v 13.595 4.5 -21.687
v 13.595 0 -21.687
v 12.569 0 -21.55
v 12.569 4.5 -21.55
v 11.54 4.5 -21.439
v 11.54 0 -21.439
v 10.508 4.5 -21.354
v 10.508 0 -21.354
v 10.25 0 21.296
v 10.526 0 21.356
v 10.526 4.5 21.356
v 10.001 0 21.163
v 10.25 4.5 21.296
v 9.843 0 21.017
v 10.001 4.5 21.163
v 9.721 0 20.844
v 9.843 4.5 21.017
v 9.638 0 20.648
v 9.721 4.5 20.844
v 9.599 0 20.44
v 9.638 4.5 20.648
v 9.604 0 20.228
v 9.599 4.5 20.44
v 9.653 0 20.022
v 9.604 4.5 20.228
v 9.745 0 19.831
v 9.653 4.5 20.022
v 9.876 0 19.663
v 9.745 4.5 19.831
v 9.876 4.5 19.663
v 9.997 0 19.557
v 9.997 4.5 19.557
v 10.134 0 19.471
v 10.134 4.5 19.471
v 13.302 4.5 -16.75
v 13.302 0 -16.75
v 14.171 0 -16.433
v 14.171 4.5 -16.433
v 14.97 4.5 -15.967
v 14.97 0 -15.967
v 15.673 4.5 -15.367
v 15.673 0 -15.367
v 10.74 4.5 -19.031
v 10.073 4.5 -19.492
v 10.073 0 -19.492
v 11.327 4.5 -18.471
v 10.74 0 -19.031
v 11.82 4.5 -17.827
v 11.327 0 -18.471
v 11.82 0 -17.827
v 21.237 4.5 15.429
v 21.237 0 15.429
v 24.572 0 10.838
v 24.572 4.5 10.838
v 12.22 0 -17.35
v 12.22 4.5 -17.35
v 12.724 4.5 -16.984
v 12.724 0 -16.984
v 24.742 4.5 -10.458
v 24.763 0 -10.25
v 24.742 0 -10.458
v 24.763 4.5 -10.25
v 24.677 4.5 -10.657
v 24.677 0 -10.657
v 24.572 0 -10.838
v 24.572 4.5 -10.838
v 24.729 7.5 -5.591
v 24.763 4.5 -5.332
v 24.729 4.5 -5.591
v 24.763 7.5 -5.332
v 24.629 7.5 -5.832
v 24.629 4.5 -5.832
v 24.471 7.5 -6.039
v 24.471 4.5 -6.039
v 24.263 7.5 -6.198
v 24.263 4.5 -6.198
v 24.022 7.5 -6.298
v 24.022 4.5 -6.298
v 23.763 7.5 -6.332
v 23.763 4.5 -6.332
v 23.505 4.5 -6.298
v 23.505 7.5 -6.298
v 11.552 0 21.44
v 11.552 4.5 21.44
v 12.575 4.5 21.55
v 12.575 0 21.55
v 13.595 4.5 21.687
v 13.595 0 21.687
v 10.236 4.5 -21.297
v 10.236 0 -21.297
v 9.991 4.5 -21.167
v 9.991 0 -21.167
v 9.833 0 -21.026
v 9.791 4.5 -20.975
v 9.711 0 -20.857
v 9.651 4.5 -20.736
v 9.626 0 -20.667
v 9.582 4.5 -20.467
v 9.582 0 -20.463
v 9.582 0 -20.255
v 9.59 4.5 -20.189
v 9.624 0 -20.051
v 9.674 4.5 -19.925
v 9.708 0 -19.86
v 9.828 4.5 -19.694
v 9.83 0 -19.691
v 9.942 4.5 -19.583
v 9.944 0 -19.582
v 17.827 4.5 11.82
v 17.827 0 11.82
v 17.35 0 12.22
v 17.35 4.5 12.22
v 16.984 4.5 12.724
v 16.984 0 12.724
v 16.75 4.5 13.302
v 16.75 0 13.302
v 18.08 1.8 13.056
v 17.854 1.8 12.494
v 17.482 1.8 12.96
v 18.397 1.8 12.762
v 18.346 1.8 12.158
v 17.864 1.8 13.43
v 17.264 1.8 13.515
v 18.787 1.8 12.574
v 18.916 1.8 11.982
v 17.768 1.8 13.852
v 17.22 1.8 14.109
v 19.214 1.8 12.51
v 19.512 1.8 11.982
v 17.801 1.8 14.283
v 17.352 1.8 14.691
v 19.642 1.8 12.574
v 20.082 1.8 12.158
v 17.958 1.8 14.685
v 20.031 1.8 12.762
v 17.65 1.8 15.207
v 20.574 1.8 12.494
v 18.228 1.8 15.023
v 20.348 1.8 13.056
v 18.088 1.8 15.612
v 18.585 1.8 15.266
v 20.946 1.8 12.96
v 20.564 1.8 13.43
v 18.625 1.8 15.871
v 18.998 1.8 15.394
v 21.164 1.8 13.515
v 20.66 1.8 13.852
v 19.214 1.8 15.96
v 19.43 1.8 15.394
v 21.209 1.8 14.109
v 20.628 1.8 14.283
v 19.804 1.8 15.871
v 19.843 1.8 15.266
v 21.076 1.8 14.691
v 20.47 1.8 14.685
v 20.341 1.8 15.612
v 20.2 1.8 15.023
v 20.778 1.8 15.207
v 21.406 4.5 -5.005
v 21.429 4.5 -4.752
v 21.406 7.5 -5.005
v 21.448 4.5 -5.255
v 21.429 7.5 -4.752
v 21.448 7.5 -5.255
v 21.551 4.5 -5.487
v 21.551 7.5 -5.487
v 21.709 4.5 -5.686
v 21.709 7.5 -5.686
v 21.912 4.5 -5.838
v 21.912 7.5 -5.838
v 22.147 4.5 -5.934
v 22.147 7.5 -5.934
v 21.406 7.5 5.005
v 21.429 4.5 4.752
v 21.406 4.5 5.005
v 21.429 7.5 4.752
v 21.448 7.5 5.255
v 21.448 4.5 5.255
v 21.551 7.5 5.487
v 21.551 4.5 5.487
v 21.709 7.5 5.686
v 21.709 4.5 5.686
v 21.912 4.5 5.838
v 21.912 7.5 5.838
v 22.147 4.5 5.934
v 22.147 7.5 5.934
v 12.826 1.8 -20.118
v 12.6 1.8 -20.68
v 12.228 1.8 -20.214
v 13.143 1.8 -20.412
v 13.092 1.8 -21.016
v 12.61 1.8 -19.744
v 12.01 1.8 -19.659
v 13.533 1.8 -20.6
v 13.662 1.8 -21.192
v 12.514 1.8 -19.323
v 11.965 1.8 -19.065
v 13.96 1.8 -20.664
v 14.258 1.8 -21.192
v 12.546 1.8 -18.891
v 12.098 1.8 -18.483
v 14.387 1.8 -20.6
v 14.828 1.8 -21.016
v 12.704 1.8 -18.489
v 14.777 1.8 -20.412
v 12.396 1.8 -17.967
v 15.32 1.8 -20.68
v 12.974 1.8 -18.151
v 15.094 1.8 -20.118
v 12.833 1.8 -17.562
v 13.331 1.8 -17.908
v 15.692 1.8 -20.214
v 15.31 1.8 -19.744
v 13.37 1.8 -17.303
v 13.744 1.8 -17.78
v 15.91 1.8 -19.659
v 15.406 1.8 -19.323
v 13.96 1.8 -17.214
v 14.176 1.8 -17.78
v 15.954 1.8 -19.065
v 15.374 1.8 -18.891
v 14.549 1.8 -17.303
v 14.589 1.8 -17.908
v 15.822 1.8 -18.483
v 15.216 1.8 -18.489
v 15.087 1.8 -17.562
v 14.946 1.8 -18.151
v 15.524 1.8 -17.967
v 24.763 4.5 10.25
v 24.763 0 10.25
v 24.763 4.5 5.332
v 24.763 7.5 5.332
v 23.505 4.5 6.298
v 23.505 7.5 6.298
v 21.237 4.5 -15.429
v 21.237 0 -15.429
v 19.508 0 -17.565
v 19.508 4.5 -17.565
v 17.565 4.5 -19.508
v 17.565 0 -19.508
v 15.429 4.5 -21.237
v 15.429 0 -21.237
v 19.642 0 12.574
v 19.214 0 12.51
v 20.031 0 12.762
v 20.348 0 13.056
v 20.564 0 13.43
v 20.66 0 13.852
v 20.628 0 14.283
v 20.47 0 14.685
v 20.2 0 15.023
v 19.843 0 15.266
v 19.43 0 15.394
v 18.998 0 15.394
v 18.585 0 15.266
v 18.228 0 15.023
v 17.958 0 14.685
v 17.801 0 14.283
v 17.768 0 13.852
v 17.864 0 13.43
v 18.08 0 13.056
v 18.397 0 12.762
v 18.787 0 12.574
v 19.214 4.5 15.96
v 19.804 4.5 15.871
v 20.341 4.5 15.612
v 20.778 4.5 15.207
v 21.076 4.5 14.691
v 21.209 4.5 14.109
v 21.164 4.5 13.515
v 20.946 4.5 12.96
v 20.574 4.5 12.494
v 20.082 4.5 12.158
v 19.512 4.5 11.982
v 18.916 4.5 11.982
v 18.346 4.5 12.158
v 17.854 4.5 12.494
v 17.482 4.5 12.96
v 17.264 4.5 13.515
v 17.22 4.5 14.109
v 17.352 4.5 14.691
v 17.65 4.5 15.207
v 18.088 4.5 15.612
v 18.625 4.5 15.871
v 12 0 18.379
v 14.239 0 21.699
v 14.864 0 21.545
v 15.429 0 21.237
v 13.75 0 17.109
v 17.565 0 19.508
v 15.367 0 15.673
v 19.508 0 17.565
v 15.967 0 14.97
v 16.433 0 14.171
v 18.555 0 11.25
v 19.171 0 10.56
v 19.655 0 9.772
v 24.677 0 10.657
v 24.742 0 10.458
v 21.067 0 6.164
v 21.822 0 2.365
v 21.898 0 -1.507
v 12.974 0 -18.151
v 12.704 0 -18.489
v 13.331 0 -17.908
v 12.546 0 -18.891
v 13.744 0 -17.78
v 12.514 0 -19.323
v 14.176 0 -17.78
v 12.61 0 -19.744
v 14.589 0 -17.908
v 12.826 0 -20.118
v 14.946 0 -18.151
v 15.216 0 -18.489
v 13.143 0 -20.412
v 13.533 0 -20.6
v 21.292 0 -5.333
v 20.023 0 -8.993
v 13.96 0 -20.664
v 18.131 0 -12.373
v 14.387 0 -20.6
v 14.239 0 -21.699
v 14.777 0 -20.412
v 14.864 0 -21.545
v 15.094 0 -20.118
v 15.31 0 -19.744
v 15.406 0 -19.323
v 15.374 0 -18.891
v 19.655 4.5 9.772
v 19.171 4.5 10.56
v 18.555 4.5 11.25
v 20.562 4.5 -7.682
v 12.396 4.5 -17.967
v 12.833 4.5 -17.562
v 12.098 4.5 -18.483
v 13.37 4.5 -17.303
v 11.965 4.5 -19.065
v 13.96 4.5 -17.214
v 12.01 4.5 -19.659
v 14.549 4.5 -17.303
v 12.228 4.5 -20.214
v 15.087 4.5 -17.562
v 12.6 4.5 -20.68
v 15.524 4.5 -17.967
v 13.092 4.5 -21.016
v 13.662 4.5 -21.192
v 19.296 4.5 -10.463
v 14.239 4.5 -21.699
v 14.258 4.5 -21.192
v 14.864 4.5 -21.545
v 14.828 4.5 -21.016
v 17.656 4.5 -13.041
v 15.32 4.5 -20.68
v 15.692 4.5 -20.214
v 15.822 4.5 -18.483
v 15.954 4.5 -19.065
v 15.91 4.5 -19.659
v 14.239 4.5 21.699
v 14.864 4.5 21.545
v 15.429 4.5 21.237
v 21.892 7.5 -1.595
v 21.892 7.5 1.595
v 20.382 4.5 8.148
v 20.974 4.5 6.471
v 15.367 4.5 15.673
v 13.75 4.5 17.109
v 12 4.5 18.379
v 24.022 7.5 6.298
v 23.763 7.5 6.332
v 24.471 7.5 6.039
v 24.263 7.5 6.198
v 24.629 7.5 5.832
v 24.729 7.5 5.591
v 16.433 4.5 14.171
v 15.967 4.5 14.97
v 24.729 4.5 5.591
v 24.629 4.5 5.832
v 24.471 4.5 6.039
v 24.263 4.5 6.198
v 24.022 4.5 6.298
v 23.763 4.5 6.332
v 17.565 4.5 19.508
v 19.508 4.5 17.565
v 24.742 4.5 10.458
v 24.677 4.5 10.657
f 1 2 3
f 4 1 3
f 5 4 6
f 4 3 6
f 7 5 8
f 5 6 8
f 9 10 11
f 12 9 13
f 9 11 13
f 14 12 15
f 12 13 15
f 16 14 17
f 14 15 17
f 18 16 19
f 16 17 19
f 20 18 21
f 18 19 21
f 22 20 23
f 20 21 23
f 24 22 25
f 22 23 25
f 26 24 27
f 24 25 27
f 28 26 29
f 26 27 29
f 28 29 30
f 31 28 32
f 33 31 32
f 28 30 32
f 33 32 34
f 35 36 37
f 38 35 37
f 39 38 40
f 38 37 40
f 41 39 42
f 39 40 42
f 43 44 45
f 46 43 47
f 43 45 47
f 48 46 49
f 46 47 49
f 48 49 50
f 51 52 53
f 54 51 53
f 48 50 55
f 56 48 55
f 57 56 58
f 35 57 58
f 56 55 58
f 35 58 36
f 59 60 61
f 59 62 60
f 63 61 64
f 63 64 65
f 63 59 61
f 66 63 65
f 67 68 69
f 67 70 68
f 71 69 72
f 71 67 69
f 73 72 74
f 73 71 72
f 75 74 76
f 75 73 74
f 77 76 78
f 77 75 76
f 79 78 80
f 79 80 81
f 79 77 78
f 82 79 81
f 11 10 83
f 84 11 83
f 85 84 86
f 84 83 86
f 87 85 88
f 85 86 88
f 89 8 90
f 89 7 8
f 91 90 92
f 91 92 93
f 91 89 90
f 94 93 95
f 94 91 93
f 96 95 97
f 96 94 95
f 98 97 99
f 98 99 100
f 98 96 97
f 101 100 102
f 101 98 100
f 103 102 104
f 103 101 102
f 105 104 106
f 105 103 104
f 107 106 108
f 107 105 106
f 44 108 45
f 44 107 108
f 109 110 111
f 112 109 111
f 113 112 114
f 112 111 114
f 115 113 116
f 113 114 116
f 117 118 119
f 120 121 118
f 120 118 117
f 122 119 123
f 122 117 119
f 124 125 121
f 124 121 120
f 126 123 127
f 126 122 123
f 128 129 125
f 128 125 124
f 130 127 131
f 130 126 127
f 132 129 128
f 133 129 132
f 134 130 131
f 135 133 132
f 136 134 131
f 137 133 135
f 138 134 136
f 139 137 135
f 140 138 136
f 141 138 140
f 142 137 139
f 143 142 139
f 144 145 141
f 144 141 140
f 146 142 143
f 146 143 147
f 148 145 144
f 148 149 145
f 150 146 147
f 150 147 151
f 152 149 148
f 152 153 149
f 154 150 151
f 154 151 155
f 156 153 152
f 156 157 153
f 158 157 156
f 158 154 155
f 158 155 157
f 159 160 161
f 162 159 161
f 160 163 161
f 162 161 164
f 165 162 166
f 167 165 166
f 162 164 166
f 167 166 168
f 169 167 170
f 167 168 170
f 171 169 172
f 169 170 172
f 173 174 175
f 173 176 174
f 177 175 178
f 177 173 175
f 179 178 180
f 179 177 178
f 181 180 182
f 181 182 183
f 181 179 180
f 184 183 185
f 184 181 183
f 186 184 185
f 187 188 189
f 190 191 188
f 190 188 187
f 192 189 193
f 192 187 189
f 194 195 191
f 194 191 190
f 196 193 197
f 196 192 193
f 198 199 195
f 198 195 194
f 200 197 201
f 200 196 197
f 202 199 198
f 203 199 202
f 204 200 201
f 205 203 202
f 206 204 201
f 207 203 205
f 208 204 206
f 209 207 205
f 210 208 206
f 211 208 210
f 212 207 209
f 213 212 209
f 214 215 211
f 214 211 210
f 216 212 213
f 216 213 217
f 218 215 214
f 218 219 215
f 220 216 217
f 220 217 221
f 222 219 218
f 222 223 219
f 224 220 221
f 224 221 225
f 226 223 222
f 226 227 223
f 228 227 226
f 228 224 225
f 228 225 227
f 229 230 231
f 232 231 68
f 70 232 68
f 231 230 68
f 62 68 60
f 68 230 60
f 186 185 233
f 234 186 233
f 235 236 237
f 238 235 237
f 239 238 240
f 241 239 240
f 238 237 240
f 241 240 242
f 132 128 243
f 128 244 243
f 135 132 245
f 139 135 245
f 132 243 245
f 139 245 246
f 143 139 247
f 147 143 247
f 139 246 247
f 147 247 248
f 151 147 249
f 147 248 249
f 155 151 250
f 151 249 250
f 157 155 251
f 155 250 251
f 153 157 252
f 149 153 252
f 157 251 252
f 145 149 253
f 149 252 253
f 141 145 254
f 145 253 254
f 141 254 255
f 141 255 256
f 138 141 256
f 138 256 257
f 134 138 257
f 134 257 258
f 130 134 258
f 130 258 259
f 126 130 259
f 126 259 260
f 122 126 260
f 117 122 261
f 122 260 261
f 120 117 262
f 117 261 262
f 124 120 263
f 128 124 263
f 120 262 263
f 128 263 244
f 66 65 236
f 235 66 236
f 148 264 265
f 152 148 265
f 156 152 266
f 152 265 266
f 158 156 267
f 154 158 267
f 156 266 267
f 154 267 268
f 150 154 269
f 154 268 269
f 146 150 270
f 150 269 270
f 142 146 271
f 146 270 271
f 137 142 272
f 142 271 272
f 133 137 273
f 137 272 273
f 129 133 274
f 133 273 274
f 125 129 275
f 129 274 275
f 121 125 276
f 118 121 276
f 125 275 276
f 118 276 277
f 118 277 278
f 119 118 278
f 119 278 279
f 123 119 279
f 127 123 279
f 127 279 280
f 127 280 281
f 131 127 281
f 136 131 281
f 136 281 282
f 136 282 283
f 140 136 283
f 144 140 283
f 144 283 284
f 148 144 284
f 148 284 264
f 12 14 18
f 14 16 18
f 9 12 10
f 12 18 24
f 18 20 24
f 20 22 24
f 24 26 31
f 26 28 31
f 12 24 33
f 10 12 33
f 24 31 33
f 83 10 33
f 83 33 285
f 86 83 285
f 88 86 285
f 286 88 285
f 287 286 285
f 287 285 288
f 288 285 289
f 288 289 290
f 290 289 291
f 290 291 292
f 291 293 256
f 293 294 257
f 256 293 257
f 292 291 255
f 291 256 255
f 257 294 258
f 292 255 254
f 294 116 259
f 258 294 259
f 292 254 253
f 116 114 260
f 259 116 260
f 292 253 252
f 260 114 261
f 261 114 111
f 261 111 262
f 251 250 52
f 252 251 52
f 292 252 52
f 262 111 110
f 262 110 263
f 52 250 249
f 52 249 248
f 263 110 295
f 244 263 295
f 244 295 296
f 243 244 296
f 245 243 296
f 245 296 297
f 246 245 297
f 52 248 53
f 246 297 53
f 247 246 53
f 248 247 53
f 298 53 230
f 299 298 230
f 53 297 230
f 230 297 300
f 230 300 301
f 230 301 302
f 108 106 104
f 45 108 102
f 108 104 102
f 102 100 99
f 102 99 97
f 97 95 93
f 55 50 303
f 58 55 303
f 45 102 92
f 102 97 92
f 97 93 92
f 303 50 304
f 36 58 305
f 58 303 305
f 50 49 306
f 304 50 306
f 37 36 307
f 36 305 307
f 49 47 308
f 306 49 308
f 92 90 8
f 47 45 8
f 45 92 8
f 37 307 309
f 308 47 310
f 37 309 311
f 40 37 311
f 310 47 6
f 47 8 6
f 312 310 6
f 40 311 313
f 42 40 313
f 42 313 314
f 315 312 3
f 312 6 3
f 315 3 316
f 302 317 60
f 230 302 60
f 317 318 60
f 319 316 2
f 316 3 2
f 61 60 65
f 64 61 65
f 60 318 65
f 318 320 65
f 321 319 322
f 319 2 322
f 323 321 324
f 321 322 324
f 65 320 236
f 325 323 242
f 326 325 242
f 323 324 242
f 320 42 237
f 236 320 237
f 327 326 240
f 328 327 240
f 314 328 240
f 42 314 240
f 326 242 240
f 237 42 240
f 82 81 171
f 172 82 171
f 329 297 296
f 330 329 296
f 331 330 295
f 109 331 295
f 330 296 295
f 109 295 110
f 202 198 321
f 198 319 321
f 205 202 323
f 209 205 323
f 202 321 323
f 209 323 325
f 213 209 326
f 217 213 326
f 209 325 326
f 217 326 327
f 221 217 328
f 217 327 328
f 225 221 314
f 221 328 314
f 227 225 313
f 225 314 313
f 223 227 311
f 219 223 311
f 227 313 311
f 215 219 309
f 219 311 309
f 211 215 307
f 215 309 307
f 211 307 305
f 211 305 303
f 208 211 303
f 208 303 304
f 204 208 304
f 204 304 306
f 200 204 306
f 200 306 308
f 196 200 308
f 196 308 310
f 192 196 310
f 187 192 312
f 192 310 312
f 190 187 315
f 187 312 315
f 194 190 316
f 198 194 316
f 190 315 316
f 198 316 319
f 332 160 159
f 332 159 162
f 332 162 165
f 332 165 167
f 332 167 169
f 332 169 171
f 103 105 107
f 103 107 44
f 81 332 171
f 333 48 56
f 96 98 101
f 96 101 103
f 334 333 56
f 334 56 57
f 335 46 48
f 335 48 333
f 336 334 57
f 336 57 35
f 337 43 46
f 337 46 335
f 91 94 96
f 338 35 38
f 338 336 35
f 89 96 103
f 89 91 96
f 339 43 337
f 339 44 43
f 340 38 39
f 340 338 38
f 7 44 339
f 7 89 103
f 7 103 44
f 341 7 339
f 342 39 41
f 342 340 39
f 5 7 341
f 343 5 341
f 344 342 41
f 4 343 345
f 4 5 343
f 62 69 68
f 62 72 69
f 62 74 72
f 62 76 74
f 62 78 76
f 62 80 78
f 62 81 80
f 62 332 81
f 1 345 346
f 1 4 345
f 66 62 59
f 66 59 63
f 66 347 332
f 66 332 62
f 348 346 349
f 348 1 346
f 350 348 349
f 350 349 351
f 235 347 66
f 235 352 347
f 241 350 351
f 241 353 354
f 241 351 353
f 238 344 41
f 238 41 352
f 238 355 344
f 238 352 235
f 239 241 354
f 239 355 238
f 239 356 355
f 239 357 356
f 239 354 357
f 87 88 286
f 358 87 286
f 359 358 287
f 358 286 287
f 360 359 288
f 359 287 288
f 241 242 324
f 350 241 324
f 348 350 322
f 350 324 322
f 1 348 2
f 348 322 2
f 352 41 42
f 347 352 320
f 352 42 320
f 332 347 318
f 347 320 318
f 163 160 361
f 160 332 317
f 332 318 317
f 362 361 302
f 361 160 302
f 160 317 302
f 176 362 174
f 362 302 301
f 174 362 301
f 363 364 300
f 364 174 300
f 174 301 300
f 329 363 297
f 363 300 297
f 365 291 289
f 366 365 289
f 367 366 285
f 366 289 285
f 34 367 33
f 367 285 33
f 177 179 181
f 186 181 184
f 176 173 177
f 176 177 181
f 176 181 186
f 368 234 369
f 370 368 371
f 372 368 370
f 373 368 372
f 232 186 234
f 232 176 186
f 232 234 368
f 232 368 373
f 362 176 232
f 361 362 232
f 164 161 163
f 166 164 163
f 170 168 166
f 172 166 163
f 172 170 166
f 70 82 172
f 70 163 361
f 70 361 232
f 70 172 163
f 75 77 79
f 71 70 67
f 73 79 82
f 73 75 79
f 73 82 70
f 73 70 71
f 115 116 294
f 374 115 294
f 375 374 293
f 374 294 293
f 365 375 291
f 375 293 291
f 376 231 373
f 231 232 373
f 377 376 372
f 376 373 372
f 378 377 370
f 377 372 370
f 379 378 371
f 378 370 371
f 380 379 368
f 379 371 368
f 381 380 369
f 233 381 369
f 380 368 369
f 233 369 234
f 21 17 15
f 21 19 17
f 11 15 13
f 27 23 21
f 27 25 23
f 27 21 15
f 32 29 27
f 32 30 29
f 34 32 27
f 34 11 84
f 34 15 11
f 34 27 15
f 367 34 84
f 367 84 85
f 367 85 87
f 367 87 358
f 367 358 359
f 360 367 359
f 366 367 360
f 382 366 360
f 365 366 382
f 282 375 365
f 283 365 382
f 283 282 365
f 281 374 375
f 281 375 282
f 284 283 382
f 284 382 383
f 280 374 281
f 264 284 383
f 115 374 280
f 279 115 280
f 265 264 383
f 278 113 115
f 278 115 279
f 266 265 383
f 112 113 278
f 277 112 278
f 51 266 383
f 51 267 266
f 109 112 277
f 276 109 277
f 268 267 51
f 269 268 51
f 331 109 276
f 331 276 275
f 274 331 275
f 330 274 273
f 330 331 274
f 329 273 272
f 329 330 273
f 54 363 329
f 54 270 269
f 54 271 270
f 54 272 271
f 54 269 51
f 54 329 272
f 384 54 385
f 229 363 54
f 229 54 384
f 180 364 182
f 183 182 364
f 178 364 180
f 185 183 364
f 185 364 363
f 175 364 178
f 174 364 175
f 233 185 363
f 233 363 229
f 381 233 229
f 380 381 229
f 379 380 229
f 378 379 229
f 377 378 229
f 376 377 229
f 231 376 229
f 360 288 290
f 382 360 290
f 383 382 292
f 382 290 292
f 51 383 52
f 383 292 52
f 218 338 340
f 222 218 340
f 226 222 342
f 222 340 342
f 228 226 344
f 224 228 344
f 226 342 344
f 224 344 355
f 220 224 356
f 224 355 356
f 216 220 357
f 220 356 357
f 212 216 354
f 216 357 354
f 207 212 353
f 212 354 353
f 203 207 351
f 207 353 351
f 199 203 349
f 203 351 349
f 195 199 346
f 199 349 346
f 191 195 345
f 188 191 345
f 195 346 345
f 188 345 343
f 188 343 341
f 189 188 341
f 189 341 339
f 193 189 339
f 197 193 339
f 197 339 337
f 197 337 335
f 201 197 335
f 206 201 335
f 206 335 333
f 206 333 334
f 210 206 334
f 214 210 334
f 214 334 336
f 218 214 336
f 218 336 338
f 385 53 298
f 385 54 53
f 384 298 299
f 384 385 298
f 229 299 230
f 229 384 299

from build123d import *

# Parameters (mm, degrees)
SKETCH_1_R                     = 1.0250000000000292
EXTRUDE_1_DEPTH                = 4.5
EXTRUDE_1_2_DEPTH              = 4.5
EXTRUDE_START                  = -4.5
EXTRUDE_2_DEPTH                = 4.5
EXTRUDE_3_DEPTH                = 3
SKETCH_7_R                     = 1.45
SKETCH_7_R_2                   = 1.0000000000000018
EXTRUDE_5_DEPTH                = 4.5
HOLE_WIZARD_M2_5_2_D           = 2.9
HOLE_WIZARD_M2_5_2_CBORE_D     = 4
HOLE_WIZARD_M2_5_2_CBORE_DEPTH = 2.7
FILLET_5_R                     = 1


with BuildPart() as part:
    # 草图1 → 凸台-拉伸1 (new body)
    with BuildSketch(Plane(origin=(0, 0, 0), x_dir=(1, 0, 0), z_dir=(0, 1, 0))):
        with BuildLine():
            ThreePointArc((21.348606100588817, 5.102893058050916), (21.291819851832585, 9.358175160870491), (21.68743992704855, 13.595407182923395))
            ThreePointArc((21.687439927048548, 13.595407182923395), (21.641903090720017, 14.556584323583055), (21.236696102342364, 15.429362872677498))
            ThreePointArc((21.236696102342368, 15.429362872677501), (18.56155300614698, 18.56155300614684), (15.429362872677654, 21.236696102342243))
            ThreePointArc((15.429362872677654, 21.23669610234224), (14.556584323583243, 21.641903090720017), (13.595407182923555, 21.68743992704845))
            ThreePointArc((13.595407182923555, 21.687439927048445), (10.687287616312432, 21.367018761558228), (7.763526238556964, 21.26002089734574))
            ThreePointArc((7.763526238556963, 21.260020897345733), (6.432472496268358, 21.282173332286177), (5.102893058051164, 21.348606100588782))
            ThreePointArc((5.1028930580511656, 21.348606100588796), (7.485262352646101, 20.634276035569133), (9.771526987407864, 19.65501870602934))
            ThreePointArc((9.771526987407862, 19.655018706029338), (10.918636162855368, 18.878721056795385), (11.820114941555765, 17.82713486814756))
            ThreePointArc((11.820114941555765, 17.82713486814756), (12.461047348600456, 17.151160280748954), (13.301996390818283, 16.750484973796134))
            ThreePointArc((13.301996390818283, 16.750484973796134), (14.580686550664556, 16.218085710353485), (15.673465718169814, 15.367009220448802))
            ThreePointArc((15.673465718169815, 15.367009220448805), (19.20928084513133, 10.621018285120913), (21.348606100588796, 5.102893058050913))
        make_face()
        with Locations(Location((13.959899741946257, 19.214153616405042, 0), (0, 0, 270))):
            Circle(SKETCH_1_R, mode=Mode.SUBTRACT)
    extrude(amount=EXTRUDE_1_DEPTH)



with BuildPart() as body_2:
    # 草图1 → Extrude 1 2 (new body)
    with BuildSketch(Plane(origin=(0, 0, 0), x_dir=(1, 0, 0), z_dir=(0, 1, 0))):
        with BuildLine():
            ThreePointArc((21.687439927048345, -13.59540718292358), (21.291819851832443, -9.358175160870594), (21.348606100588746, -5.102893058050941))
            ThreePointArc((21.348606100588746, -5.10289305805094), (20.63427603556909, -7.4852623526459166), (19.655018706029292, -9.771526987407722))
            ThreePointArc((19.655018706029292, -9.77152698740772), (18.87872105679534, -10.918636162855227), (17.827134868147517, -11.82011494155563))
            ThreePointArc((17.827134868147517, -11.82011494155563), (17.151160280748865, -12.461047348600282), (16.7504849737961, -13.301996390818143))
            ThreePointArc((16.7504849737961, -13.301996390818143), (16.218085710353446, -14.580686550664424), (15.367009220448757, -15.673465718169691))
            ThreePointArc((15.367009220448761, -15.673465718169693), (10.621018285120737, -19.209280845131296), (5.1028930580505785, -21.348606100588768))
            ThreePointArc((5.102893058050578, -21.348606100588754), (9.35817516087026, -21.29181985183253), (13.595407182923264, -21.68743992704851))
            ThreePointArc((13.595407182923264, -21.687439927048516), (13.777164655836453, -21.707466249891656), (13.959899741946161, -21.714153616404968))
            ThreePointArc((13.959899741946161, -21.714153616404968), (14.732442227883533, -21.591794907142855), (15.429362872677345, -21.236696102342332))
            ThreePointArc((15.429362872677347, -21.236696102342336), (18.561553006146696, -18.561553006146962), (21.23669610234214, -15.429362872677675))
            ThreePointArc((21.236696102342137, -15.429362872677672), (21.64190309071992, -14.556584323583264), (21.687439927048352, -13.595407182923577))
        make_face()
        with BuildLine():
            ThreePointArc((19.21415361640496, -12.509899741946258), (20.66415361640495, -13.95989974194627), (19.214153616404936, -15.409899741946257))
            ThreePointArc((19.214153616404936, -15.409899741946255), (17.76415361640495, -13.959899741946243), (19.21415361640496, -12.509899741946256))
        make_face(mode=Mode.SUBTRACT)
    extrude(amount=EXTRUDE_1_2_DEPTH)


with BuildPart() as part_1:
    add(part.part)

    add(body_2.part)  # 凸台-拉伸2 merges body 2
    # 草图4 → 凸台-拉伸2 (add)
    with BuildSketch(Plane(origin=(0, 4.5, 0), x_dir=(1, 0, 0), z_dir=(0, 1, 0)).offset(EXTRUDE_START)):
        with BuildLine():
            Line((21.236696102342133, -15.429362872677666), (24.7634076160975, -10.575260906428365))
            Line((24.7634076160975, -10.575260906428365), (24.7634076160975, 10.575260906428364))
            Line((24.7634076160975, 10.575260906428364), (21.236696102342353, 15.429362872677489))
            ThreePointArc((21.236696102342353, 15.429362872677489), (21.641903090720028, 14.556584323583055), (21.687439927048562, 13.595407182923394))
            ThreePointArc((21.687439927048562, 13.595407182923394), (21.2918198518326, 9.358175160870505), (21.348606100588814, 5.102893058050923))
            ThreePointArc((21.348606100588814, 5.102893058050923), (21.950000000000014, -1.41e-14), (21.34860610058875, -5.102893058050941))
            ThreePointArc((21.34860610058875, -5.102893058050941), (21.291819851832443, -9.358175160870587), (21.687439927048448, -13.595407182923562))
            ThreePointArc((21.687439927048448, -13.595407182923562), (21.64190309071992, -14.556584323583241), (21.236696102342133, -15.429362872677666))
        make_face()
    extrude(amount=EXTRUDE_2_DEPTH)

    # 草图5 → 凸台-拉伸3 (add)
    with BuildSketch(Plane(origin=(0, 4.5, 0), x_dir=(1, 0, 0), z_dir=(0, 1, 0))):
        with BuildLine():
            Line((21.20207188704507, -5.68107804000035), (24.7634076160975, -6.635335072576056))
            Line((24.7634076160975, -6.635335072576056), (24.7634076160975, 6.635335072576056))
            Line((24.7634076160975, 6.635335072576056), (21.202071887045097, 5.681078040000357))
            ThreePointArc((21.202071887045097, 5.681078040000357), (21.950000000000045, 2.96e-15), (21.20207188704507, -5.68107804000035))
        make_face()
    extrude(amount=EXTRUDE_3_DEPTH)

    # 草图7 → 凸台-拉伸5 (add)
    with BuildSketch(Plane(origin=(0, 4.5, 0), x_dir=(1, 0, 0), z_dir=(0, 1, 0)).offset(EXTRUDE_START)):
        with Locations((19.21415361640495, -13.959899741946257)):
            Circle(SKETCH_7_R)
        with Locations(Location((19.21415361640495, -13.959899741946257, 0), (0, 0, 270))):
            Circle(SKETCH_7_R_2, mode=Mode.SUBTRACT)
    extrude(amount=EXTRUDE_5_DEPTH)

    # M2.5 六角圆柱头螺钉的柱形沉头孔2 (through all)
    with Locations(Plane(origin=(13.959899742, 4.5, -19.214153616), x_dir=(0, 0, 1), z_dir=(0, 1, 0))):
        with Locations((0, 0), (33.174053358, 5.254253874)):
            CounterBoreHole(HOLE_WIZARD_M2_5_2_D / 2, HOLE_WIZARD_M2_5_2_CBORE_D / 2, HOLE_WIZARD_M2_5_2_CBORE_DEPTH)

    # 圆角5
    fillet_5_edges = [part_1.edges().sort_by_distance(p)[0] for p in [
        (24.7634076160975, 2.25, 10.575260906428365),
        (24.7634076160975, 2.25, -10.575260906428364),
        (24.7634076160975, 6, -6.635335072576056),
        (21.202071887045093, 6, -5.681078040000356),
        (21.202071887045065, 6, 5.681078040000351),
        (24.7634076160975, 6, 6.635335072576056),
        (5.1028930580505785, 2.25, 21.34860610058876),
        (5.102893058051165, 2.25, -21.34860610058879),
    ]]
    fillet(fillet_5_edges, radius=FILLET_5_R)


solid = part_1.part
